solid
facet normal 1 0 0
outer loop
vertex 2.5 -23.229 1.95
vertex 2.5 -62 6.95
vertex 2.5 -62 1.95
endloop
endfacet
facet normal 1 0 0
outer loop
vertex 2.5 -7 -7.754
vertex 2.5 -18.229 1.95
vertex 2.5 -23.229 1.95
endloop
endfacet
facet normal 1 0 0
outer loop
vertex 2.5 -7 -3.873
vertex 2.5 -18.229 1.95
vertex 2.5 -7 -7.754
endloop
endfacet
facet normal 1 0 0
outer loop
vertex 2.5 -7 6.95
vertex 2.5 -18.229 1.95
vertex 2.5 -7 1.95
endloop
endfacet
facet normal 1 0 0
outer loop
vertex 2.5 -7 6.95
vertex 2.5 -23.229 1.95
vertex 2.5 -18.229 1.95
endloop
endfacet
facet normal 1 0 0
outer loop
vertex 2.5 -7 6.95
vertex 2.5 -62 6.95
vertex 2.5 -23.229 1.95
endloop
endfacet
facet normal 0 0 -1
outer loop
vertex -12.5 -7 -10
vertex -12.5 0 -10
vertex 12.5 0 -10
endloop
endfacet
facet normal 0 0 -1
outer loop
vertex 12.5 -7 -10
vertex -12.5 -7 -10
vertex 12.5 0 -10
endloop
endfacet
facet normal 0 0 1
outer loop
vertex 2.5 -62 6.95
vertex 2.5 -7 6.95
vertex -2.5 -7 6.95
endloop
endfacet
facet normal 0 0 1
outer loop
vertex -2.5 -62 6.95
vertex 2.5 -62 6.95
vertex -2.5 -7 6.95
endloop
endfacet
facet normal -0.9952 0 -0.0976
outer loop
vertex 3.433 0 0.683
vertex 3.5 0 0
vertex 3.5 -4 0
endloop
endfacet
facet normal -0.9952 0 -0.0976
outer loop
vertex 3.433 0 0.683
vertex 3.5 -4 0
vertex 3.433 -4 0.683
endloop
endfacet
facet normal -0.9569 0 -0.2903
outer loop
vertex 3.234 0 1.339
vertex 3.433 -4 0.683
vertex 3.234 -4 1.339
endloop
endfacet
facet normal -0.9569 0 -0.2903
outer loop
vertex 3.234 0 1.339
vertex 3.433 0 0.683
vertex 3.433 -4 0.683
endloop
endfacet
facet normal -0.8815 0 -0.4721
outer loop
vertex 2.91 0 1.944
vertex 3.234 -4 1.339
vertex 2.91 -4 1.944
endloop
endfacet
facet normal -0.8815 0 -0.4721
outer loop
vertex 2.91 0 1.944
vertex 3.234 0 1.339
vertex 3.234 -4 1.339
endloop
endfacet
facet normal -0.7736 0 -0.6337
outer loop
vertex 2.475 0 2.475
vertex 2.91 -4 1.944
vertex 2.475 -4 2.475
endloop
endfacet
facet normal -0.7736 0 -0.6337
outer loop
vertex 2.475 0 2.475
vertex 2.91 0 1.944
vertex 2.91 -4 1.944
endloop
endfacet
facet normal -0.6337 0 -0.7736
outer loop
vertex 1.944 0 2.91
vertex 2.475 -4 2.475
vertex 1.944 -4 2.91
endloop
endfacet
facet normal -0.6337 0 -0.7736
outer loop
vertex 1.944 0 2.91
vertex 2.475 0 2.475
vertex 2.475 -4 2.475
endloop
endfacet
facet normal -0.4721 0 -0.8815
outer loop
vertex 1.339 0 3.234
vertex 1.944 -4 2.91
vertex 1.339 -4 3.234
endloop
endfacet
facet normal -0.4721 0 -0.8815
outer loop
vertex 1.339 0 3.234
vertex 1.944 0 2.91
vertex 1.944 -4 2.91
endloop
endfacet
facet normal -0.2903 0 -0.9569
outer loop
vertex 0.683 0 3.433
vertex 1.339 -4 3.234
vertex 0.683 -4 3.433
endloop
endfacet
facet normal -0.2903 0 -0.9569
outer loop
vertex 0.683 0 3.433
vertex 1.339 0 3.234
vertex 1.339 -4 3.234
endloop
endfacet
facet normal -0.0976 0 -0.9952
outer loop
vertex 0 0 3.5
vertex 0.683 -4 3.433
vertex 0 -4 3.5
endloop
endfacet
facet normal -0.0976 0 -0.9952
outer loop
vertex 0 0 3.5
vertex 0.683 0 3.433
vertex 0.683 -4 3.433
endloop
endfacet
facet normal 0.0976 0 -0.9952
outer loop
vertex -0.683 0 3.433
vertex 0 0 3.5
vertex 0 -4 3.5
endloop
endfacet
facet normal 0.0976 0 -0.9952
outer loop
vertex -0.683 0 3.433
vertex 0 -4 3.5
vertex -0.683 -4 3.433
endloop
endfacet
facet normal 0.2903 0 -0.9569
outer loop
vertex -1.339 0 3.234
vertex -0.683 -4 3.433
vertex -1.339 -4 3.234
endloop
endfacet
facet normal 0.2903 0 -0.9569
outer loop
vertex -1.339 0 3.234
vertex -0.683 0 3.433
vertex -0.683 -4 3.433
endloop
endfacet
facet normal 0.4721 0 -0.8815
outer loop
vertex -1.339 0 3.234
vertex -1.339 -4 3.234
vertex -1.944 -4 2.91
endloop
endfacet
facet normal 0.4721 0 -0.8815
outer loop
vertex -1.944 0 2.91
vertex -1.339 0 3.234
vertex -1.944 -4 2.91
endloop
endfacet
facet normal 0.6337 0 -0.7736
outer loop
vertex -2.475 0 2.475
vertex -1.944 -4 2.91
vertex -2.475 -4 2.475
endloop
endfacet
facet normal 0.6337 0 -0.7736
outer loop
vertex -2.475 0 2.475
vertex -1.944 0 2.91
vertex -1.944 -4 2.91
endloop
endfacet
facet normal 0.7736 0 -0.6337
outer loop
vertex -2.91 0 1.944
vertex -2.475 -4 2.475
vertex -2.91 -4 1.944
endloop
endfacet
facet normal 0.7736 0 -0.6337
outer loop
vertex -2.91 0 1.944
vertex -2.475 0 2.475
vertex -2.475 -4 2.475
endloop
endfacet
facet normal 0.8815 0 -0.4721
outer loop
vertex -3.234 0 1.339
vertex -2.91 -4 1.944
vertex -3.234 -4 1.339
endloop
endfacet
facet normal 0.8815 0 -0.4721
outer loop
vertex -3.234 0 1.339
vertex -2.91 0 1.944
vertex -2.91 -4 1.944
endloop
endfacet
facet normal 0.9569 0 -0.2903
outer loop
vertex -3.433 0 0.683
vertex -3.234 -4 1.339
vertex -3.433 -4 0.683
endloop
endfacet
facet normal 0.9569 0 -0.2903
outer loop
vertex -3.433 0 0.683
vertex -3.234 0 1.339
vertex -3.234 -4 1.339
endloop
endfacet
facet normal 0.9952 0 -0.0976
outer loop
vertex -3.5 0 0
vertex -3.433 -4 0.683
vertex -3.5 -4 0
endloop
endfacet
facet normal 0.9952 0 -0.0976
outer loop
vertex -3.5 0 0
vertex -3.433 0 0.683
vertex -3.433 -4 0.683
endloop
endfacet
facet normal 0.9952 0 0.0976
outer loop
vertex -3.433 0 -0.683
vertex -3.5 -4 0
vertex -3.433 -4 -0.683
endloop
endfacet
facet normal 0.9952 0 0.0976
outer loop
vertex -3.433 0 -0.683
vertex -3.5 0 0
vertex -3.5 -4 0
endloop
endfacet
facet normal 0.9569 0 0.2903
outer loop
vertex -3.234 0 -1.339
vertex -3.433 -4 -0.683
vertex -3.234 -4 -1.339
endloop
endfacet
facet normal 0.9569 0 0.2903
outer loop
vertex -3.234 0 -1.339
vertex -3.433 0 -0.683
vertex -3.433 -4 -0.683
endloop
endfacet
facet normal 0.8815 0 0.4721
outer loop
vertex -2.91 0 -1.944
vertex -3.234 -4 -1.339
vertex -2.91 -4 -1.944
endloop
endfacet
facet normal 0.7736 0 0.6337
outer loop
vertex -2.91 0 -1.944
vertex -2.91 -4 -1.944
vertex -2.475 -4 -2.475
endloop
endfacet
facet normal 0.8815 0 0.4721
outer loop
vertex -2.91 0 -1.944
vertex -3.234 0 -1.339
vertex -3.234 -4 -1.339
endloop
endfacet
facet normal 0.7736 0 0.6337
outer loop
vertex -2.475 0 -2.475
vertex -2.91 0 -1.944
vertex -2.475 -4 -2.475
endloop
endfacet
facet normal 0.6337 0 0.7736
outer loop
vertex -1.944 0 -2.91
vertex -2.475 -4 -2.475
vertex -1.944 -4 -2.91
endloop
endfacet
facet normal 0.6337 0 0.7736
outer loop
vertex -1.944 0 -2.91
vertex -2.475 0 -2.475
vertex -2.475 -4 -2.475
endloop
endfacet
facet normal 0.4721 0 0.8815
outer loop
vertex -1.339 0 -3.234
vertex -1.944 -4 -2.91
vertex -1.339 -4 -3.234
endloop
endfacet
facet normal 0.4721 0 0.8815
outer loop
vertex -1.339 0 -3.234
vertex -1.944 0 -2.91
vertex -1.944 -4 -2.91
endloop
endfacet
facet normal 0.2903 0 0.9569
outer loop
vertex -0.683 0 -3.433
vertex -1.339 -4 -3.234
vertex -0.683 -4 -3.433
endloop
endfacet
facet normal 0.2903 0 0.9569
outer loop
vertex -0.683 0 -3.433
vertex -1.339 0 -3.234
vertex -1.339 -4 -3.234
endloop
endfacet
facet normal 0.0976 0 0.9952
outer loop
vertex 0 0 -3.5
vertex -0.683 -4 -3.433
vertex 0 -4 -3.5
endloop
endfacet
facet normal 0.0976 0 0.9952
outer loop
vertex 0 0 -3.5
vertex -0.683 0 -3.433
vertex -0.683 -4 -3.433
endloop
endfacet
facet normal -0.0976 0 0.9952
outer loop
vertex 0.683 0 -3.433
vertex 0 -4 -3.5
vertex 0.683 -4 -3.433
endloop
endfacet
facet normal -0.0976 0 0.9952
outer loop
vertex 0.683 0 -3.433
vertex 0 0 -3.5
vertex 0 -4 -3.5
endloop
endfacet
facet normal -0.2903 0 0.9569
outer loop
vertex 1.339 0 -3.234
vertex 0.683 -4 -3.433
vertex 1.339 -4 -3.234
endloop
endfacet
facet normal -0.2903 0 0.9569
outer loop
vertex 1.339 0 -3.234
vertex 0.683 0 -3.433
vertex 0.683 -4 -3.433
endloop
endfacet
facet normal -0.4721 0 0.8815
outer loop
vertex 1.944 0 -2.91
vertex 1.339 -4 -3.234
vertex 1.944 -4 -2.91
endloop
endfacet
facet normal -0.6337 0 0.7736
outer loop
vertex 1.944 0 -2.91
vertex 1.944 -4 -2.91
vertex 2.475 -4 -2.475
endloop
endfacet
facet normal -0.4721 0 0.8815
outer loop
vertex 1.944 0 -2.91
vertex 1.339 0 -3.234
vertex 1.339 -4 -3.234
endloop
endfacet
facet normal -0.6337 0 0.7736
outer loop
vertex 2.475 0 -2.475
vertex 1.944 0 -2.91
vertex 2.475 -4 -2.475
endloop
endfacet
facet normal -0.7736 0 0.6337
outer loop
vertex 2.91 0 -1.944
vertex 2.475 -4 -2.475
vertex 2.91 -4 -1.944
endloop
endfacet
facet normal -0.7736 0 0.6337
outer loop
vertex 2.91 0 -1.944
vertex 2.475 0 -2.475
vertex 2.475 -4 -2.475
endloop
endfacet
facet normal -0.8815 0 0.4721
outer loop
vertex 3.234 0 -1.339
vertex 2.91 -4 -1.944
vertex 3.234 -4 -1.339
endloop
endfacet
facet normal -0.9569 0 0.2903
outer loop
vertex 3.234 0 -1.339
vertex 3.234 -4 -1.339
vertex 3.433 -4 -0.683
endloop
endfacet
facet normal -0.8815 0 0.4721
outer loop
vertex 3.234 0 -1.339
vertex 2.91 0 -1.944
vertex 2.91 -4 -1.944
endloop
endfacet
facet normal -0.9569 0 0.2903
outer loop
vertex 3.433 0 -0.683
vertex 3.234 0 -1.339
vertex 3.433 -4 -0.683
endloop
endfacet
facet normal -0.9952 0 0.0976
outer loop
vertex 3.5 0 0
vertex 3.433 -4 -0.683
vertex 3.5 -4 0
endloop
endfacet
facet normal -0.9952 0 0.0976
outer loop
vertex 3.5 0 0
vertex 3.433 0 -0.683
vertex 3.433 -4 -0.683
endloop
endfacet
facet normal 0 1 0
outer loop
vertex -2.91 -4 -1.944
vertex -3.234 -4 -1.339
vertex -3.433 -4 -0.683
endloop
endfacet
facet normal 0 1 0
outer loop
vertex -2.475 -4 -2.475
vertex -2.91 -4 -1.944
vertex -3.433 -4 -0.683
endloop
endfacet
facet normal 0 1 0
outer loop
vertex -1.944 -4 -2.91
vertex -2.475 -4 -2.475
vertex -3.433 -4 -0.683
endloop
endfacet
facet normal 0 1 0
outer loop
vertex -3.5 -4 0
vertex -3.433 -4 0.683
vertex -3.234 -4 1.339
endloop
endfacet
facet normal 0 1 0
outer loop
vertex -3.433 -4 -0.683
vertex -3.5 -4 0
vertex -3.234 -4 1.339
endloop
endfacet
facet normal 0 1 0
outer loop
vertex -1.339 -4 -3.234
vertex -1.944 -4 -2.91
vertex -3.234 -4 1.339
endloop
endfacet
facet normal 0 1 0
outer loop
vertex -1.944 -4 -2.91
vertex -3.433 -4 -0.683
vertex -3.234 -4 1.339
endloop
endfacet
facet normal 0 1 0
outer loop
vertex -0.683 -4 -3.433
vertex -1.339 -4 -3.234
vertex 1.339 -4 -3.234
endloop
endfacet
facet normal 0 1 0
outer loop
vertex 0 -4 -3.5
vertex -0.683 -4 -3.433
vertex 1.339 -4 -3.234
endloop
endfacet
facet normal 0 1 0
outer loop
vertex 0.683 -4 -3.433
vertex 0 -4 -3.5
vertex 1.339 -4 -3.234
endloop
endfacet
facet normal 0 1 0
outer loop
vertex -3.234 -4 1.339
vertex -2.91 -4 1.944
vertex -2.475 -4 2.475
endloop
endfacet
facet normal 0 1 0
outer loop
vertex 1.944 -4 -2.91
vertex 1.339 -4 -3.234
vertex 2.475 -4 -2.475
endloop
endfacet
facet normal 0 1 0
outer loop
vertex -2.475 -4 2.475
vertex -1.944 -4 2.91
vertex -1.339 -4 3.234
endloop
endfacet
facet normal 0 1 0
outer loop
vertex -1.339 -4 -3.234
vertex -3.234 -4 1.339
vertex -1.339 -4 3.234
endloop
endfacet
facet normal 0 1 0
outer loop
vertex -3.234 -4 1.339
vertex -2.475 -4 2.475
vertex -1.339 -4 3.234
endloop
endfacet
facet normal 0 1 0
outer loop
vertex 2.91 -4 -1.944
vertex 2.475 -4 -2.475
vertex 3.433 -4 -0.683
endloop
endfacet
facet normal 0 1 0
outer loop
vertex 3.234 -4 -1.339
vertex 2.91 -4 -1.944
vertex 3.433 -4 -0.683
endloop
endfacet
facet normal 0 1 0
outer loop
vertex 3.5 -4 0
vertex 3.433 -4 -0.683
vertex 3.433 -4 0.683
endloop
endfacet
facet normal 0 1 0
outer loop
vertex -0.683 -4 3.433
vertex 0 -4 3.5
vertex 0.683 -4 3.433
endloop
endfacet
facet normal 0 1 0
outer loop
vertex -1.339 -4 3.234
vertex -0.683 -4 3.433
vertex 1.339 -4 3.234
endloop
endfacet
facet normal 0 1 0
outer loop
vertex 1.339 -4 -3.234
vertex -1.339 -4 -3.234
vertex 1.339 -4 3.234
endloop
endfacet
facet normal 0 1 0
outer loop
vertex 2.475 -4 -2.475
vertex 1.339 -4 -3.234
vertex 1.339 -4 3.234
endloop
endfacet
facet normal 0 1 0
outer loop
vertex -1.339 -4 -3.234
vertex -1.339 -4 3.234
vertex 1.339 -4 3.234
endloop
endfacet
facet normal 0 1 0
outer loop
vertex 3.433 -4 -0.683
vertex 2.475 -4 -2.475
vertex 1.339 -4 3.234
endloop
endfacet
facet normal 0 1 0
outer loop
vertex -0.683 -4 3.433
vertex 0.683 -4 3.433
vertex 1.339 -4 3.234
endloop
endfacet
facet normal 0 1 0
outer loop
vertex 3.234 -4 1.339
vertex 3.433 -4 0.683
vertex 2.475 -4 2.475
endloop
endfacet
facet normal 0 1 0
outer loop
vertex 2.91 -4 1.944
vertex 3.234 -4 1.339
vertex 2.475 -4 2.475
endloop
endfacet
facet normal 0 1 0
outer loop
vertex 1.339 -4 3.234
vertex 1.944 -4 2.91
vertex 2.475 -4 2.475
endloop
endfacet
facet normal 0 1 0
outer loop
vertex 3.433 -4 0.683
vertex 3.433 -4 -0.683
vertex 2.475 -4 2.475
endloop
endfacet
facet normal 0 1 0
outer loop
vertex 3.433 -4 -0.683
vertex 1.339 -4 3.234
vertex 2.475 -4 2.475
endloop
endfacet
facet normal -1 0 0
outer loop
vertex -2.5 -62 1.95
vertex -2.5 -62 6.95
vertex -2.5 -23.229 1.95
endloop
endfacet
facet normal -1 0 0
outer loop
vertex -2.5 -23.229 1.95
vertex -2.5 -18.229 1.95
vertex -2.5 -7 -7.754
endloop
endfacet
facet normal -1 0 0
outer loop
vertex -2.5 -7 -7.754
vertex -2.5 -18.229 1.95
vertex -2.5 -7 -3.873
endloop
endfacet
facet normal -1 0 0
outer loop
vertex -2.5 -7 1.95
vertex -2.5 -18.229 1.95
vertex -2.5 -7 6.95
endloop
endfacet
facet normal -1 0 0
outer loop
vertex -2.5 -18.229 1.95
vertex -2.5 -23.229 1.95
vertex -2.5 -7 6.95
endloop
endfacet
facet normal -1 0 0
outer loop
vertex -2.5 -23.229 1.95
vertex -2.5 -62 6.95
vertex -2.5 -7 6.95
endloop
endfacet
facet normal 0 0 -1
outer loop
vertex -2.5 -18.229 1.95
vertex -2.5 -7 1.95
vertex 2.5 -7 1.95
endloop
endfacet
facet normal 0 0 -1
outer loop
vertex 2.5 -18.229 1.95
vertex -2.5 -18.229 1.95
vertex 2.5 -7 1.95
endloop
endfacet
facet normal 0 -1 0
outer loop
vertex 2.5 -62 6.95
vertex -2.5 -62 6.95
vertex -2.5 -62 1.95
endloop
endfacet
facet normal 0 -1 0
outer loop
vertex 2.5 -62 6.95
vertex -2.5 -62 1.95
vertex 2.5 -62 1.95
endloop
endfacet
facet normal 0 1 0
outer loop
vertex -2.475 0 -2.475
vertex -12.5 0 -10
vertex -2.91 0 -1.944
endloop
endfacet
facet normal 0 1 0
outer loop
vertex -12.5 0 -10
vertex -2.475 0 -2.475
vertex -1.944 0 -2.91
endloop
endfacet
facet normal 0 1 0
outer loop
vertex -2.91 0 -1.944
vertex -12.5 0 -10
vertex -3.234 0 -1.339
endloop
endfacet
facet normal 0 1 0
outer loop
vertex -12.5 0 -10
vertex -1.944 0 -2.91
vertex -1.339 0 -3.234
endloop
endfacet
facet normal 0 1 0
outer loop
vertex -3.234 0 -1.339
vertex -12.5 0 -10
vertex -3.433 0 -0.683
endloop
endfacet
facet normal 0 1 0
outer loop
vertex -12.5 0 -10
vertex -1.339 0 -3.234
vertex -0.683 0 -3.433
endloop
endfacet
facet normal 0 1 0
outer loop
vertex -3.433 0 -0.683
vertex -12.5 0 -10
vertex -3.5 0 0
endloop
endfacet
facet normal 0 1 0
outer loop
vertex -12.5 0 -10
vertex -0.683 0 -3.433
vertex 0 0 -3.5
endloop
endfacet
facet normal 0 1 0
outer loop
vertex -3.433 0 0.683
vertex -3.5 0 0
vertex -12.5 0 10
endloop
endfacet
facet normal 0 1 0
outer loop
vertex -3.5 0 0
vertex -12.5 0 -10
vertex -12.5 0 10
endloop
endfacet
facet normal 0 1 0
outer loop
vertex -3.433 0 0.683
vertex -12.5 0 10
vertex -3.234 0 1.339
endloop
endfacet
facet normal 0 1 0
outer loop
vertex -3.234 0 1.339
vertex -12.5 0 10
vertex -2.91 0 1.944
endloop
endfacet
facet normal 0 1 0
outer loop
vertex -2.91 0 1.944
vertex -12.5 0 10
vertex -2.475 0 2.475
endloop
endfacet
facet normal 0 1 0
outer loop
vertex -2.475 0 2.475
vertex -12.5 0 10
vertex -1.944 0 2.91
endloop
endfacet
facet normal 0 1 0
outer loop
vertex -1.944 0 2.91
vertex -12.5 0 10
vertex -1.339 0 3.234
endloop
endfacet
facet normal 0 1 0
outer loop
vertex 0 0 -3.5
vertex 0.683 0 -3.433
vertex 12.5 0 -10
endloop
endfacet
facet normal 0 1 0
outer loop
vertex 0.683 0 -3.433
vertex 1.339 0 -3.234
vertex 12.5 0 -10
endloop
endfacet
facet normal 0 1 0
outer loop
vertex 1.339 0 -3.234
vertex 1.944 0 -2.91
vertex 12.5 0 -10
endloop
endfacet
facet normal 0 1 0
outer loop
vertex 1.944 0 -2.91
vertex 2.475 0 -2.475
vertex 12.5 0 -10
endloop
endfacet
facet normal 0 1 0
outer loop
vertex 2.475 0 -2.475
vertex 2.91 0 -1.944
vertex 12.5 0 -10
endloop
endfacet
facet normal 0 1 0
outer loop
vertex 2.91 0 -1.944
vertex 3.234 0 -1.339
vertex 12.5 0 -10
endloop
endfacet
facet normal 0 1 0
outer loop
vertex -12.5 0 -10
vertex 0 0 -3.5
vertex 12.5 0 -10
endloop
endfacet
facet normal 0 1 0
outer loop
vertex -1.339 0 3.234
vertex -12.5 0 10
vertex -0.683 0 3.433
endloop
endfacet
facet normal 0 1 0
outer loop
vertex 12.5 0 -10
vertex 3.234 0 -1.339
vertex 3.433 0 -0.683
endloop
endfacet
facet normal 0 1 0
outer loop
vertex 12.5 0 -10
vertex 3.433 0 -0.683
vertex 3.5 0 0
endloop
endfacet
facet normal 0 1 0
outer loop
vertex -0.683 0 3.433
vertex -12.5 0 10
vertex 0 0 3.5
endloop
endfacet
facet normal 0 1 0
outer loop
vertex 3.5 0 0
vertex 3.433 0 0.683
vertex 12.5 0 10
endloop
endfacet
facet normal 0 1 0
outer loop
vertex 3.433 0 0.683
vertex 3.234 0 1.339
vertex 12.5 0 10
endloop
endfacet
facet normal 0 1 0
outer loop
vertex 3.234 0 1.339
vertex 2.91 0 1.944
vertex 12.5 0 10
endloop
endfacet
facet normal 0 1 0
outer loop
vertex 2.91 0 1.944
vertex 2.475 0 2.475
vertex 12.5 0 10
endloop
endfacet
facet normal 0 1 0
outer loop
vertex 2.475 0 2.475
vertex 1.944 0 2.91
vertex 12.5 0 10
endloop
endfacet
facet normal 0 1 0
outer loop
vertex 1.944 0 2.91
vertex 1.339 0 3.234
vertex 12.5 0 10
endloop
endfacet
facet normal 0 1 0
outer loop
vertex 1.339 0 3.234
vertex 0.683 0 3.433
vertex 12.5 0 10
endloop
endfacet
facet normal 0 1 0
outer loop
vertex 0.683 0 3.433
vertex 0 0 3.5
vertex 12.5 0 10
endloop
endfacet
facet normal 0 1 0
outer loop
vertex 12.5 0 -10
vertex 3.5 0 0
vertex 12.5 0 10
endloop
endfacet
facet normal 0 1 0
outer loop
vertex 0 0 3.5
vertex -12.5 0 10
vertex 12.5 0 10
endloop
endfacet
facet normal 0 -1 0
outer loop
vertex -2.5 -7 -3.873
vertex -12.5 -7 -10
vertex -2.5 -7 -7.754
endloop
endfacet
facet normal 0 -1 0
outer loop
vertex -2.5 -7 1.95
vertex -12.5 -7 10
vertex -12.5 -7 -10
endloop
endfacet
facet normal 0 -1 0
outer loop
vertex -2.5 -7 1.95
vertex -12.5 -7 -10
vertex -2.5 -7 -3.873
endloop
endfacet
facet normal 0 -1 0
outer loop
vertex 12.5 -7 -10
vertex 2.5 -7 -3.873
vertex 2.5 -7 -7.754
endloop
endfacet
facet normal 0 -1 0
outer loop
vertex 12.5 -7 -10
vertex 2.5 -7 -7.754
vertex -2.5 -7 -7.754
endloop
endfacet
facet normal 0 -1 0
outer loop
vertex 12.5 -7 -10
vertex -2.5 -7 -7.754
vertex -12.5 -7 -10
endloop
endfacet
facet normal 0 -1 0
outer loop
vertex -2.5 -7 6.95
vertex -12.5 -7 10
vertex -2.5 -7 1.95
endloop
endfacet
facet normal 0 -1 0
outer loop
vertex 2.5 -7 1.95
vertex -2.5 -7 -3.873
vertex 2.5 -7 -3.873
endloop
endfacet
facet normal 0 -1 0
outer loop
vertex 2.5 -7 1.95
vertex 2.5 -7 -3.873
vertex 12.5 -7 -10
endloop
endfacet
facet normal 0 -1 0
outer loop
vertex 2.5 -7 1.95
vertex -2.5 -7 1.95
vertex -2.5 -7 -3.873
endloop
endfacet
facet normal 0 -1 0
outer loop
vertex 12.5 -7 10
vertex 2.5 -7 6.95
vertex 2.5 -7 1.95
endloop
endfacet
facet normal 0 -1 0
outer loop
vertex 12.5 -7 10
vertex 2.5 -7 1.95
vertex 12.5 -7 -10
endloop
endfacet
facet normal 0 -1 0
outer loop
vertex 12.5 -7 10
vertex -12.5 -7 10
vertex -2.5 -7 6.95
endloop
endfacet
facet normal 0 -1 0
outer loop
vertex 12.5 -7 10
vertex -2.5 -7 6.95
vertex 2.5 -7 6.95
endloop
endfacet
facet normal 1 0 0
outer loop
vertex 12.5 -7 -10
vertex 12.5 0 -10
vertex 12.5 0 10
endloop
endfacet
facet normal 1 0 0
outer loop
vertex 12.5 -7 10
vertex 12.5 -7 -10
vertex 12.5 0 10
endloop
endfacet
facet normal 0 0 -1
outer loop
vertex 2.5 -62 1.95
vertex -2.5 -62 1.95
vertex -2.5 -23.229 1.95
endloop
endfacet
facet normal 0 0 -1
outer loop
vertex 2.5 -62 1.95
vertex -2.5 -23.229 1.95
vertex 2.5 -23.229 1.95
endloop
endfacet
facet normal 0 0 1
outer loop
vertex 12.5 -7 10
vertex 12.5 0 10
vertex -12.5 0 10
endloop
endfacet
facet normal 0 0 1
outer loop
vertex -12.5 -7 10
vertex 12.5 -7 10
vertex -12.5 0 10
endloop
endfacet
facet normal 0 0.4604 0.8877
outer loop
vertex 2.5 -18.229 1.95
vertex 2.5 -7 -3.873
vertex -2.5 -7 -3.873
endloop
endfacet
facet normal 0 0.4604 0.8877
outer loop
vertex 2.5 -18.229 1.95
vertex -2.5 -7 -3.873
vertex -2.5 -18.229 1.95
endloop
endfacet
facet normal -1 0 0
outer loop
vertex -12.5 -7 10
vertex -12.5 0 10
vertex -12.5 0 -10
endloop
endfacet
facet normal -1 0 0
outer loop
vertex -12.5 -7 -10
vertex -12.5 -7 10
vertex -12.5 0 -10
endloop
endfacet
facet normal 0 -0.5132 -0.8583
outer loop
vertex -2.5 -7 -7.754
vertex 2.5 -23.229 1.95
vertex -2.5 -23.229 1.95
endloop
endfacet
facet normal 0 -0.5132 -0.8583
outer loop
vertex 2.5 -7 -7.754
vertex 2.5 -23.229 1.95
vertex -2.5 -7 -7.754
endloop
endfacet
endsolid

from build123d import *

# Parameters (mm, degrees)
F1_DEPTH = 7
F2_R     = 3.5
F3_DEPTH = 4
F5_DEPTH = 55
F7_DEPTH = 5


with BuildPart() as f1:
    # F0 (on Front) → F1 (new body)
    with BuildSketch(Plane.XZ):
        Polygon((12.5, 10), (0, 10), (-12.5, 10), (-12.5, 0.040646), (-12.5, -10), (12.5, -10), align=None)
    extrude(amount=F1_DEPTH)

    # F2 (on Front) → F3 (cut)
    with BuildSketch(Plane.XZ):
        Circle(F2_R)
    extrude(amount=F3_DEPTH, mode=Mode.SUBTRACT)

    # F4 (on face) → F5 (join)
    with BuildSketch(Plane.XZ.offset(7)):
        Polygon((2.5, 6.950472), (0, 6.950472), (-2.5, 6.950472), (-2.5, 1.950472), (2.5, 1.950472), align=None)
    extrude(amount=F5_DEPTH)

    # F6 (on face) → F7 (join)
    with BuildSketch(Plane.YZ.offset(2.5)):
        Polygon((-5.509801, -4.645343), (-18.229285, 1.950472), (-23.229285, 1.950472), (-5.509801, -8.645343), align=None)
    extrude(amount=-F7_DEPTH)


solid = f1.part
